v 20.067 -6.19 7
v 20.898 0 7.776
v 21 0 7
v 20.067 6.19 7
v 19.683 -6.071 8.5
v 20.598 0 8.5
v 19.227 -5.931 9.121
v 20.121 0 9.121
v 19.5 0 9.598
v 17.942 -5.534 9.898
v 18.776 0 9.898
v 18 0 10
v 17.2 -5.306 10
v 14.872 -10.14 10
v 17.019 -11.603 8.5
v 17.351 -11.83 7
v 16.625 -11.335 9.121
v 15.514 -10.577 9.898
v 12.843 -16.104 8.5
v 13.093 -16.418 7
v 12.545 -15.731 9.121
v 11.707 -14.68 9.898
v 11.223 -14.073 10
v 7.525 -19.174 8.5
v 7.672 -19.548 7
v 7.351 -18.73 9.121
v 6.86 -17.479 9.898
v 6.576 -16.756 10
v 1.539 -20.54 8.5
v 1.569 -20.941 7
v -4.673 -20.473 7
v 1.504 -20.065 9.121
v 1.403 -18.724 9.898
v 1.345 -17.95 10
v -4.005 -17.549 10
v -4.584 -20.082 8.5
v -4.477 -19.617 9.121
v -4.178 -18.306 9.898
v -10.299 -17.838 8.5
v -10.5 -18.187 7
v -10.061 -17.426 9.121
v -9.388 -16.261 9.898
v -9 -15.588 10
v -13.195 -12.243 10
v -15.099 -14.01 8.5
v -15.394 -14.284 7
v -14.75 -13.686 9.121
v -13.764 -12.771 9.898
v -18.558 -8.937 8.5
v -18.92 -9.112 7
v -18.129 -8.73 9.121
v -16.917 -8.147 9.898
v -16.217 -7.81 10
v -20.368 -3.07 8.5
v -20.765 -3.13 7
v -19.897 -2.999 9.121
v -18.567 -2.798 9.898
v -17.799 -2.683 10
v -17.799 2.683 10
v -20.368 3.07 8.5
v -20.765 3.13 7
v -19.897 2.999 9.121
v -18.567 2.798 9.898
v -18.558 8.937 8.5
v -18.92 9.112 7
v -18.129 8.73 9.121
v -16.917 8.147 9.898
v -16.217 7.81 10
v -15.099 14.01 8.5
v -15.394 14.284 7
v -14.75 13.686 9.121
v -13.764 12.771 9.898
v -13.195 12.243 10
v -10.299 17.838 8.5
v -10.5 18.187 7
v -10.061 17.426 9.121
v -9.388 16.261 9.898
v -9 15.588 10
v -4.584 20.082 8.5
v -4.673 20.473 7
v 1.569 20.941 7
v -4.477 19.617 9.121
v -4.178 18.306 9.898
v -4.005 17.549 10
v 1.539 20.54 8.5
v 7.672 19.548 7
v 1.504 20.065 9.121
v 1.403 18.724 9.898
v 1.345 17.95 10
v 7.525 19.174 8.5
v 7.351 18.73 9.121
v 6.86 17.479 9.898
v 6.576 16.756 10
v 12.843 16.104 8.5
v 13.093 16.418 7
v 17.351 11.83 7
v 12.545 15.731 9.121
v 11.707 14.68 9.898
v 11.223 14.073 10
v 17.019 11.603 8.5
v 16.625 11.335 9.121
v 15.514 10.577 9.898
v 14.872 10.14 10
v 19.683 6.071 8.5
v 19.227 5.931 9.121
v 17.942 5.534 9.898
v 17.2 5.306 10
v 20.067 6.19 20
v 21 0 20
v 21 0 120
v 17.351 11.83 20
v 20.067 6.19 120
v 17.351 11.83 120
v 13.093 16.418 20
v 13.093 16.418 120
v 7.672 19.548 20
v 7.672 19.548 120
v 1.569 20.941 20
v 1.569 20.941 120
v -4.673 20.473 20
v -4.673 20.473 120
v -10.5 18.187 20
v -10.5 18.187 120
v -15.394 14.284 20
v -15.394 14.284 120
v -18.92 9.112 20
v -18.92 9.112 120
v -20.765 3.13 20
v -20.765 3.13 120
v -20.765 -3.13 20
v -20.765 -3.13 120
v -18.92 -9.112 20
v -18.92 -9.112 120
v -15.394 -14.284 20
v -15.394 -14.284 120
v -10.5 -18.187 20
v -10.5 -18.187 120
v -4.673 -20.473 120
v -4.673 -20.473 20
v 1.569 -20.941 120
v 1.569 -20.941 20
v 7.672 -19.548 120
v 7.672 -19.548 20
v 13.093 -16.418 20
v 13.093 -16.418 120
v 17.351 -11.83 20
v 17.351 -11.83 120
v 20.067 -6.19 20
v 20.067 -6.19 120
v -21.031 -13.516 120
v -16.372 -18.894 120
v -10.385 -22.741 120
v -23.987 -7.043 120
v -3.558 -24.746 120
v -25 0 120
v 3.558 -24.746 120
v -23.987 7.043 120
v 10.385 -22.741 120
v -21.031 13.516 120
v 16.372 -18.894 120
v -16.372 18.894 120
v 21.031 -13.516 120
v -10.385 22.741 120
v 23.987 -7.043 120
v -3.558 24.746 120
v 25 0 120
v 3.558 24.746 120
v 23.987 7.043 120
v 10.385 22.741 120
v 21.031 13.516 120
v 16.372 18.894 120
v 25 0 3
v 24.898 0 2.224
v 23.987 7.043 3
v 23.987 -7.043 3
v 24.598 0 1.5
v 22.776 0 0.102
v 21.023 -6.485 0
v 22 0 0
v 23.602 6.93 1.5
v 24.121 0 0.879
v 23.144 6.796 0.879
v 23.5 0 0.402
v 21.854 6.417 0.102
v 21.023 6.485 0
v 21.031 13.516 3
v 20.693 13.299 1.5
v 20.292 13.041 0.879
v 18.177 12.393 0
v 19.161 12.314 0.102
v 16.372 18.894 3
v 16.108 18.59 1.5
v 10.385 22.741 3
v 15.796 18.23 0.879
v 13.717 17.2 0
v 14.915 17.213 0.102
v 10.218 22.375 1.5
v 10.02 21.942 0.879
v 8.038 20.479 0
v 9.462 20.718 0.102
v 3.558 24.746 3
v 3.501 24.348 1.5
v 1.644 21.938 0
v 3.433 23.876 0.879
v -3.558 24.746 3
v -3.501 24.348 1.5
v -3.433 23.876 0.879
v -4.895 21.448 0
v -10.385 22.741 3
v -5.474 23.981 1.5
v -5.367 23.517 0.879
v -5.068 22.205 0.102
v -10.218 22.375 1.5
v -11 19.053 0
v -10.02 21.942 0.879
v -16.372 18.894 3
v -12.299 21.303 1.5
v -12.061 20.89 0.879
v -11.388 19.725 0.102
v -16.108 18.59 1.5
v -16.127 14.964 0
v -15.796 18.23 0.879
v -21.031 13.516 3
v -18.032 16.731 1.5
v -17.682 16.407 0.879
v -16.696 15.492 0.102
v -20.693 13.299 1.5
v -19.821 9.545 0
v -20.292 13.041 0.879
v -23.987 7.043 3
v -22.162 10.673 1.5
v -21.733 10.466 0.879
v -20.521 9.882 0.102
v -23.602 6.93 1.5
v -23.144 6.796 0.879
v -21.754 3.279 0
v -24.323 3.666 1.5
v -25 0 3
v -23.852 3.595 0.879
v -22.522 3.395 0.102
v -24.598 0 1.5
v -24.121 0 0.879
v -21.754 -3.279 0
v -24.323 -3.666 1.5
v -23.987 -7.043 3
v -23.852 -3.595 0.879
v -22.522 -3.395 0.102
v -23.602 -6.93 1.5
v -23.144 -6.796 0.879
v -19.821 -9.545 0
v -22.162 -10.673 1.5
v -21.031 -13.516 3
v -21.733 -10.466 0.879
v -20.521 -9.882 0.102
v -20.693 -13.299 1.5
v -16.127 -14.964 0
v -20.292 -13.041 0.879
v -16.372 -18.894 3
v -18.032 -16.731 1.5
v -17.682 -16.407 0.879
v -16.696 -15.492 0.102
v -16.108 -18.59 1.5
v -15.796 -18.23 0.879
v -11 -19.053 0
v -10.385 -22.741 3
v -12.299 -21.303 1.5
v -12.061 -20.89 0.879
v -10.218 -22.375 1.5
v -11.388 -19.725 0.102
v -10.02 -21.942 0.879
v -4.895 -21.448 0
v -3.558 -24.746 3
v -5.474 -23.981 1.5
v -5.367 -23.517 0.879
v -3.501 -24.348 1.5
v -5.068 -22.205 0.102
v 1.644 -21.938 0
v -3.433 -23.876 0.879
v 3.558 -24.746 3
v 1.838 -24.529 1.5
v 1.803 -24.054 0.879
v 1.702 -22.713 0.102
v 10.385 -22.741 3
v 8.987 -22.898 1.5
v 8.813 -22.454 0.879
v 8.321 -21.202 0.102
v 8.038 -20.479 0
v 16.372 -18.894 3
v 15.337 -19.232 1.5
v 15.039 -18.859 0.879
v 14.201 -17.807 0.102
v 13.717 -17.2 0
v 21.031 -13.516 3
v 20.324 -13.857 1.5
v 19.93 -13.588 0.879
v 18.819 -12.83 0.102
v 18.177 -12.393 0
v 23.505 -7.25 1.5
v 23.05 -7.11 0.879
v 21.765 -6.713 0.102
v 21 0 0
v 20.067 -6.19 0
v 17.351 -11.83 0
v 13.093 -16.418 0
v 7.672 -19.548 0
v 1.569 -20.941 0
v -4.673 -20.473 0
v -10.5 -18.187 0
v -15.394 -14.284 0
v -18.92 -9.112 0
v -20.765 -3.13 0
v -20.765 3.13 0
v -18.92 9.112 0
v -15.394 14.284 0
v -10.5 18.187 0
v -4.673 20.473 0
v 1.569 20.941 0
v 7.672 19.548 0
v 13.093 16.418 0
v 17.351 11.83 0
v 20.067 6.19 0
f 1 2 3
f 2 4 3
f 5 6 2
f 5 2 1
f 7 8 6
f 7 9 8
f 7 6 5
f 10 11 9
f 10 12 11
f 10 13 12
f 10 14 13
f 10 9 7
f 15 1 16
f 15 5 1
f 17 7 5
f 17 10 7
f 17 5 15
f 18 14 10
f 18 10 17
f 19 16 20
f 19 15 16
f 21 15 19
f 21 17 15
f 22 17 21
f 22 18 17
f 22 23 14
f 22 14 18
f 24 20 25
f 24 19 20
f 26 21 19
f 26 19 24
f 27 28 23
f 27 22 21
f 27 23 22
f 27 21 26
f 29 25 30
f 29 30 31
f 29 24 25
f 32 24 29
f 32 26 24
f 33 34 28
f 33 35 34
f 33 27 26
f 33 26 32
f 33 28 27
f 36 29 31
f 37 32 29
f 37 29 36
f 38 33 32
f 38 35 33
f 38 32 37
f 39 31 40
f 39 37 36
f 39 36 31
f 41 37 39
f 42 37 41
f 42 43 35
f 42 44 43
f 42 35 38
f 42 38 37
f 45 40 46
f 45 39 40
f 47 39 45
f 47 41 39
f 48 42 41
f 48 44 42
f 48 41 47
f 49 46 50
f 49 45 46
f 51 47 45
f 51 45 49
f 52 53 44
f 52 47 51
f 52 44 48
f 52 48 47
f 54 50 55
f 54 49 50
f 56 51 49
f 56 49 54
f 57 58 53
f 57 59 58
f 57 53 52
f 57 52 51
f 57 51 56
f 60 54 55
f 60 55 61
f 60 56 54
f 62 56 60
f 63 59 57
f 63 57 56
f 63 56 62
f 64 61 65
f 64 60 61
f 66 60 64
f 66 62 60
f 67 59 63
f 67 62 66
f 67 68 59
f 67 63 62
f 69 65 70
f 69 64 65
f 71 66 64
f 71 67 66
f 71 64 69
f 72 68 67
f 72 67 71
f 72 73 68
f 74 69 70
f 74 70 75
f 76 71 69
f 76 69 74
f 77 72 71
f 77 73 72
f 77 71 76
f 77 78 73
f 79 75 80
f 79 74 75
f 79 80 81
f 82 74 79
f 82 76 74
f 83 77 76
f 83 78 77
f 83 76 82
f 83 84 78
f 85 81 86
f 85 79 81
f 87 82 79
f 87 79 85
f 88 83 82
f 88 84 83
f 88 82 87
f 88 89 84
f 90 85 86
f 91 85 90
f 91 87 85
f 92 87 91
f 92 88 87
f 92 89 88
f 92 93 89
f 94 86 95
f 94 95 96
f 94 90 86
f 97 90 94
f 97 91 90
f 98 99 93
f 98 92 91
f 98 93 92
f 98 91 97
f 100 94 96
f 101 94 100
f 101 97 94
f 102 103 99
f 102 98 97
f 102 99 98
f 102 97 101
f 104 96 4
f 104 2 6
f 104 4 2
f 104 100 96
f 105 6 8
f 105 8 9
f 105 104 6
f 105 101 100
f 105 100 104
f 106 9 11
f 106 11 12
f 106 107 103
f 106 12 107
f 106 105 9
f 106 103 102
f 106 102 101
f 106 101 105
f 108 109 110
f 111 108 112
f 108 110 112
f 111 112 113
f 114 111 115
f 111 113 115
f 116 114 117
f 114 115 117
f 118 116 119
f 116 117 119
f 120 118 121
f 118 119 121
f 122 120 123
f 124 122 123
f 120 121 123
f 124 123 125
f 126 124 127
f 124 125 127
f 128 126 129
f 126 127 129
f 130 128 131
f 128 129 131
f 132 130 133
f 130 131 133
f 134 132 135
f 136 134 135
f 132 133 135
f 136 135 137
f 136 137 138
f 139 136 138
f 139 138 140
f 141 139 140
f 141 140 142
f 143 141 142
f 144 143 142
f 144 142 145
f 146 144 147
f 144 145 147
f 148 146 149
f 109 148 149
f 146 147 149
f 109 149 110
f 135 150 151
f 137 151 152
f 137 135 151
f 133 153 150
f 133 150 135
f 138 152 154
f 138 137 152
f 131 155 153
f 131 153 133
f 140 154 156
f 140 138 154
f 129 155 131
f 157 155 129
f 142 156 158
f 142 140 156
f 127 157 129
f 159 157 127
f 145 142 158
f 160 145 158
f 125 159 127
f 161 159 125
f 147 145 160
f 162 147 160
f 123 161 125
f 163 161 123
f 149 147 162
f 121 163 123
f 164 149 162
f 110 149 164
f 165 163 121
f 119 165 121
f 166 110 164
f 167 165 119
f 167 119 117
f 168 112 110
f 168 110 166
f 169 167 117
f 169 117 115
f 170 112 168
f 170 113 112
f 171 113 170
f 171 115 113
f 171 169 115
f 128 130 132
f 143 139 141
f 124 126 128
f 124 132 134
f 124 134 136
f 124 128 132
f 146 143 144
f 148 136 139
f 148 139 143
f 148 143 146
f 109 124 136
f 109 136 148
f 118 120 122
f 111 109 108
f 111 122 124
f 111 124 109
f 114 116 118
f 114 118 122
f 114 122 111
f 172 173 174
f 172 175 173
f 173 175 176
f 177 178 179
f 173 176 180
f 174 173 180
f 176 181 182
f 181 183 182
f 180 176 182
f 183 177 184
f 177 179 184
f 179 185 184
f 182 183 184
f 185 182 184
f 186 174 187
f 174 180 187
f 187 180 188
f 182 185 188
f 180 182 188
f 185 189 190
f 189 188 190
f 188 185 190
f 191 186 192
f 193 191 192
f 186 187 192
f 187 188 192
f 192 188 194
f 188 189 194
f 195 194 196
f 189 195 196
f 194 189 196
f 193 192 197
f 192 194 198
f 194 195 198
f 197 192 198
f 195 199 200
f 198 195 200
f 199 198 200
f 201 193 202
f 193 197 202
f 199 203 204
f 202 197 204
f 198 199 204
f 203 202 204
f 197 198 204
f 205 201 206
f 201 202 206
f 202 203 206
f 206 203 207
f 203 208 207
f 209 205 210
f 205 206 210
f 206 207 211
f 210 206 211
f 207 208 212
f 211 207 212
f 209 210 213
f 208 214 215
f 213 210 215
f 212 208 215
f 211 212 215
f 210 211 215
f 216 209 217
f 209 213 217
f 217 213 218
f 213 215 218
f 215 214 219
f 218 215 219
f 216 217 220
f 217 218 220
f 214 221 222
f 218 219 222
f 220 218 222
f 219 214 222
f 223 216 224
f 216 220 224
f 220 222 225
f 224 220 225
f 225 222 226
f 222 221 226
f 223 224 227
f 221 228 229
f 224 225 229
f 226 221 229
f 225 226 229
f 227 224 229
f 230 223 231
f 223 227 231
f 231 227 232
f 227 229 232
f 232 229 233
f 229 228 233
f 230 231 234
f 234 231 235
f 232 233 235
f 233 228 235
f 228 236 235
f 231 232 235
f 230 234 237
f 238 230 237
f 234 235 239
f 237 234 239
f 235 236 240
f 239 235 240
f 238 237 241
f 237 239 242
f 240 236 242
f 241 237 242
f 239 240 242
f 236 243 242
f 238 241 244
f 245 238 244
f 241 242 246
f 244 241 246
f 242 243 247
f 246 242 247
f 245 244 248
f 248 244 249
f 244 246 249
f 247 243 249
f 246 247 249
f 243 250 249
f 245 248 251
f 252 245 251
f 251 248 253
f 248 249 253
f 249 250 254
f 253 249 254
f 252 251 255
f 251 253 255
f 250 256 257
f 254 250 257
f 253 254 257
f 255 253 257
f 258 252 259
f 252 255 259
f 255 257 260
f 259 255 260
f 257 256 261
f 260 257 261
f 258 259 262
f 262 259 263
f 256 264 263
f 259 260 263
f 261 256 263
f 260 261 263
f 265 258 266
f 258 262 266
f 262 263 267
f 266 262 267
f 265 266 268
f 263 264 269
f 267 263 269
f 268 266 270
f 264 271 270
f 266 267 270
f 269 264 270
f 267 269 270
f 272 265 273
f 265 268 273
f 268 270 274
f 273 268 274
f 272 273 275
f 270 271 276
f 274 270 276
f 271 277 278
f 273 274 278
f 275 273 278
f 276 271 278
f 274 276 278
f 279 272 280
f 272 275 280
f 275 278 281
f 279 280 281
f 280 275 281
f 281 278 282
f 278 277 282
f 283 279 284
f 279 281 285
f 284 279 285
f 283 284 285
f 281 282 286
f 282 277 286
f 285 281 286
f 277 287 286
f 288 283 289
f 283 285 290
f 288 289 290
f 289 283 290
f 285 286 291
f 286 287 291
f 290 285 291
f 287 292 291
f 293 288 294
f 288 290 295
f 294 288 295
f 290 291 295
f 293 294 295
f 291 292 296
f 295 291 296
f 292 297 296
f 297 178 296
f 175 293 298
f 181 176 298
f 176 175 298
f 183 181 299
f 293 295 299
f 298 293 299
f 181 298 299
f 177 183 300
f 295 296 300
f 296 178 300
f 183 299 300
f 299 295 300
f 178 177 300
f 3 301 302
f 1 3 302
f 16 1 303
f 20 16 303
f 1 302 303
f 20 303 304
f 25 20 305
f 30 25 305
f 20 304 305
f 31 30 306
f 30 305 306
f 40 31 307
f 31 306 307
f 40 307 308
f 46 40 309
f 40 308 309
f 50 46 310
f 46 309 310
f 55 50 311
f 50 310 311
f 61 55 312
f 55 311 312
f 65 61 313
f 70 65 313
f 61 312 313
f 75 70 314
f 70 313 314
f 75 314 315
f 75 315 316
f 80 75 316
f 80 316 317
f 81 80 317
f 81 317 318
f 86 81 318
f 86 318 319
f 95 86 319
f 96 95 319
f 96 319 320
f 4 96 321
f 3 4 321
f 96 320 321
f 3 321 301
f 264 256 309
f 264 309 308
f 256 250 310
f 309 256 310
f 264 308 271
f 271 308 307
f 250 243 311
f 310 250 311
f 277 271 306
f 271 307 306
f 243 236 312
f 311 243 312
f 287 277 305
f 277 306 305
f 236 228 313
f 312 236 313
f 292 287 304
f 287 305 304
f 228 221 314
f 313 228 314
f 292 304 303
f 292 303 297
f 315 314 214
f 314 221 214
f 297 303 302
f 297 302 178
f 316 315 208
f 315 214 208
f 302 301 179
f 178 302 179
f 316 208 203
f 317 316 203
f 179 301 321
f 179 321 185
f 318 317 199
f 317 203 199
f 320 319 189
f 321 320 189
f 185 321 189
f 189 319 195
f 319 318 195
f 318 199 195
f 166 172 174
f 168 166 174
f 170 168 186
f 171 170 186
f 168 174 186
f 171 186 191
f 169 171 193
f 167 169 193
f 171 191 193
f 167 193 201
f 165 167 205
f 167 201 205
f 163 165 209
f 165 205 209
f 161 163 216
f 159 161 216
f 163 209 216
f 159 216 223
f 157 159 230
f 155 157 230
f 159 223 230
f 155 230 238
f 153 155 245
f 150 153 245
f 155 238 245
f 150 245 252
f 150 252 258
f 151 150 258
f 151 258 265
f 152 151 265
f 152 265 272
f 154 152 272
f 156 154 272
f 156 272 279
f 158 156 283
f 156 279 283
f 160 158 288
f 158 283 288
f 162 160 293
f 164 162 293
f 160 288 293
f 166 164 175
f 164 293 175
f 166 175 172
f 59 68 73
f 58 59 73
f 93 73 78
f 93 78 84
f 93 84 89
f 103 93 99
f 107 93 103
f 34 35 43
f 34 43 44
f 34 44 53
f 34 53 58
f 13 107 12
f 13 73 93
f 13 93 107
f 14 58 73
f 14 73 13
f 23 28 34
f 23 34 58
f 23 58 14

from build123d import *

# Parameters (mm, degrees)
F0_R     = 25
F1_DEPTH = 120
F2_R     = 21
F3_DEPTH = 100
F4_R     = 21
F5_DEPTH = 10
F6_R     = 3


with BuildPart() as f1:
    # F0 (on Top) → F1 (new body)
    with BuildSketch(Plane.XY):
        Circle(F0_R)
    extrude(amount=F1_DEPTH)

    # F2 (on face) → F3 (cut)
    with BuildSketch(Plane.XY.offset(120)):
        Circle(F2_R)
    extrude(amount=-F3_DEPTH, mode=Mode.SUBTRACT)

    # F4 (on face) → F5 (cut)
    with BuildSketch(Plane(origin=(0, 0, 0), x_dir=(1, 0, 0), z_dir=(0, 0, -1))):
        Circle(F4_R)
    extrude(amount=-F5_DEPTH, mode=Mode.SUBTRACT)

    # F6
    f6_edges = [f1.edges().sort_by_distance(p)[0] for p in [
        (-25, 0, 0),
        (-21, 0, 10),
    ]]
    fillet(f6_edges, radius=F6_R)


solid = f1.part
